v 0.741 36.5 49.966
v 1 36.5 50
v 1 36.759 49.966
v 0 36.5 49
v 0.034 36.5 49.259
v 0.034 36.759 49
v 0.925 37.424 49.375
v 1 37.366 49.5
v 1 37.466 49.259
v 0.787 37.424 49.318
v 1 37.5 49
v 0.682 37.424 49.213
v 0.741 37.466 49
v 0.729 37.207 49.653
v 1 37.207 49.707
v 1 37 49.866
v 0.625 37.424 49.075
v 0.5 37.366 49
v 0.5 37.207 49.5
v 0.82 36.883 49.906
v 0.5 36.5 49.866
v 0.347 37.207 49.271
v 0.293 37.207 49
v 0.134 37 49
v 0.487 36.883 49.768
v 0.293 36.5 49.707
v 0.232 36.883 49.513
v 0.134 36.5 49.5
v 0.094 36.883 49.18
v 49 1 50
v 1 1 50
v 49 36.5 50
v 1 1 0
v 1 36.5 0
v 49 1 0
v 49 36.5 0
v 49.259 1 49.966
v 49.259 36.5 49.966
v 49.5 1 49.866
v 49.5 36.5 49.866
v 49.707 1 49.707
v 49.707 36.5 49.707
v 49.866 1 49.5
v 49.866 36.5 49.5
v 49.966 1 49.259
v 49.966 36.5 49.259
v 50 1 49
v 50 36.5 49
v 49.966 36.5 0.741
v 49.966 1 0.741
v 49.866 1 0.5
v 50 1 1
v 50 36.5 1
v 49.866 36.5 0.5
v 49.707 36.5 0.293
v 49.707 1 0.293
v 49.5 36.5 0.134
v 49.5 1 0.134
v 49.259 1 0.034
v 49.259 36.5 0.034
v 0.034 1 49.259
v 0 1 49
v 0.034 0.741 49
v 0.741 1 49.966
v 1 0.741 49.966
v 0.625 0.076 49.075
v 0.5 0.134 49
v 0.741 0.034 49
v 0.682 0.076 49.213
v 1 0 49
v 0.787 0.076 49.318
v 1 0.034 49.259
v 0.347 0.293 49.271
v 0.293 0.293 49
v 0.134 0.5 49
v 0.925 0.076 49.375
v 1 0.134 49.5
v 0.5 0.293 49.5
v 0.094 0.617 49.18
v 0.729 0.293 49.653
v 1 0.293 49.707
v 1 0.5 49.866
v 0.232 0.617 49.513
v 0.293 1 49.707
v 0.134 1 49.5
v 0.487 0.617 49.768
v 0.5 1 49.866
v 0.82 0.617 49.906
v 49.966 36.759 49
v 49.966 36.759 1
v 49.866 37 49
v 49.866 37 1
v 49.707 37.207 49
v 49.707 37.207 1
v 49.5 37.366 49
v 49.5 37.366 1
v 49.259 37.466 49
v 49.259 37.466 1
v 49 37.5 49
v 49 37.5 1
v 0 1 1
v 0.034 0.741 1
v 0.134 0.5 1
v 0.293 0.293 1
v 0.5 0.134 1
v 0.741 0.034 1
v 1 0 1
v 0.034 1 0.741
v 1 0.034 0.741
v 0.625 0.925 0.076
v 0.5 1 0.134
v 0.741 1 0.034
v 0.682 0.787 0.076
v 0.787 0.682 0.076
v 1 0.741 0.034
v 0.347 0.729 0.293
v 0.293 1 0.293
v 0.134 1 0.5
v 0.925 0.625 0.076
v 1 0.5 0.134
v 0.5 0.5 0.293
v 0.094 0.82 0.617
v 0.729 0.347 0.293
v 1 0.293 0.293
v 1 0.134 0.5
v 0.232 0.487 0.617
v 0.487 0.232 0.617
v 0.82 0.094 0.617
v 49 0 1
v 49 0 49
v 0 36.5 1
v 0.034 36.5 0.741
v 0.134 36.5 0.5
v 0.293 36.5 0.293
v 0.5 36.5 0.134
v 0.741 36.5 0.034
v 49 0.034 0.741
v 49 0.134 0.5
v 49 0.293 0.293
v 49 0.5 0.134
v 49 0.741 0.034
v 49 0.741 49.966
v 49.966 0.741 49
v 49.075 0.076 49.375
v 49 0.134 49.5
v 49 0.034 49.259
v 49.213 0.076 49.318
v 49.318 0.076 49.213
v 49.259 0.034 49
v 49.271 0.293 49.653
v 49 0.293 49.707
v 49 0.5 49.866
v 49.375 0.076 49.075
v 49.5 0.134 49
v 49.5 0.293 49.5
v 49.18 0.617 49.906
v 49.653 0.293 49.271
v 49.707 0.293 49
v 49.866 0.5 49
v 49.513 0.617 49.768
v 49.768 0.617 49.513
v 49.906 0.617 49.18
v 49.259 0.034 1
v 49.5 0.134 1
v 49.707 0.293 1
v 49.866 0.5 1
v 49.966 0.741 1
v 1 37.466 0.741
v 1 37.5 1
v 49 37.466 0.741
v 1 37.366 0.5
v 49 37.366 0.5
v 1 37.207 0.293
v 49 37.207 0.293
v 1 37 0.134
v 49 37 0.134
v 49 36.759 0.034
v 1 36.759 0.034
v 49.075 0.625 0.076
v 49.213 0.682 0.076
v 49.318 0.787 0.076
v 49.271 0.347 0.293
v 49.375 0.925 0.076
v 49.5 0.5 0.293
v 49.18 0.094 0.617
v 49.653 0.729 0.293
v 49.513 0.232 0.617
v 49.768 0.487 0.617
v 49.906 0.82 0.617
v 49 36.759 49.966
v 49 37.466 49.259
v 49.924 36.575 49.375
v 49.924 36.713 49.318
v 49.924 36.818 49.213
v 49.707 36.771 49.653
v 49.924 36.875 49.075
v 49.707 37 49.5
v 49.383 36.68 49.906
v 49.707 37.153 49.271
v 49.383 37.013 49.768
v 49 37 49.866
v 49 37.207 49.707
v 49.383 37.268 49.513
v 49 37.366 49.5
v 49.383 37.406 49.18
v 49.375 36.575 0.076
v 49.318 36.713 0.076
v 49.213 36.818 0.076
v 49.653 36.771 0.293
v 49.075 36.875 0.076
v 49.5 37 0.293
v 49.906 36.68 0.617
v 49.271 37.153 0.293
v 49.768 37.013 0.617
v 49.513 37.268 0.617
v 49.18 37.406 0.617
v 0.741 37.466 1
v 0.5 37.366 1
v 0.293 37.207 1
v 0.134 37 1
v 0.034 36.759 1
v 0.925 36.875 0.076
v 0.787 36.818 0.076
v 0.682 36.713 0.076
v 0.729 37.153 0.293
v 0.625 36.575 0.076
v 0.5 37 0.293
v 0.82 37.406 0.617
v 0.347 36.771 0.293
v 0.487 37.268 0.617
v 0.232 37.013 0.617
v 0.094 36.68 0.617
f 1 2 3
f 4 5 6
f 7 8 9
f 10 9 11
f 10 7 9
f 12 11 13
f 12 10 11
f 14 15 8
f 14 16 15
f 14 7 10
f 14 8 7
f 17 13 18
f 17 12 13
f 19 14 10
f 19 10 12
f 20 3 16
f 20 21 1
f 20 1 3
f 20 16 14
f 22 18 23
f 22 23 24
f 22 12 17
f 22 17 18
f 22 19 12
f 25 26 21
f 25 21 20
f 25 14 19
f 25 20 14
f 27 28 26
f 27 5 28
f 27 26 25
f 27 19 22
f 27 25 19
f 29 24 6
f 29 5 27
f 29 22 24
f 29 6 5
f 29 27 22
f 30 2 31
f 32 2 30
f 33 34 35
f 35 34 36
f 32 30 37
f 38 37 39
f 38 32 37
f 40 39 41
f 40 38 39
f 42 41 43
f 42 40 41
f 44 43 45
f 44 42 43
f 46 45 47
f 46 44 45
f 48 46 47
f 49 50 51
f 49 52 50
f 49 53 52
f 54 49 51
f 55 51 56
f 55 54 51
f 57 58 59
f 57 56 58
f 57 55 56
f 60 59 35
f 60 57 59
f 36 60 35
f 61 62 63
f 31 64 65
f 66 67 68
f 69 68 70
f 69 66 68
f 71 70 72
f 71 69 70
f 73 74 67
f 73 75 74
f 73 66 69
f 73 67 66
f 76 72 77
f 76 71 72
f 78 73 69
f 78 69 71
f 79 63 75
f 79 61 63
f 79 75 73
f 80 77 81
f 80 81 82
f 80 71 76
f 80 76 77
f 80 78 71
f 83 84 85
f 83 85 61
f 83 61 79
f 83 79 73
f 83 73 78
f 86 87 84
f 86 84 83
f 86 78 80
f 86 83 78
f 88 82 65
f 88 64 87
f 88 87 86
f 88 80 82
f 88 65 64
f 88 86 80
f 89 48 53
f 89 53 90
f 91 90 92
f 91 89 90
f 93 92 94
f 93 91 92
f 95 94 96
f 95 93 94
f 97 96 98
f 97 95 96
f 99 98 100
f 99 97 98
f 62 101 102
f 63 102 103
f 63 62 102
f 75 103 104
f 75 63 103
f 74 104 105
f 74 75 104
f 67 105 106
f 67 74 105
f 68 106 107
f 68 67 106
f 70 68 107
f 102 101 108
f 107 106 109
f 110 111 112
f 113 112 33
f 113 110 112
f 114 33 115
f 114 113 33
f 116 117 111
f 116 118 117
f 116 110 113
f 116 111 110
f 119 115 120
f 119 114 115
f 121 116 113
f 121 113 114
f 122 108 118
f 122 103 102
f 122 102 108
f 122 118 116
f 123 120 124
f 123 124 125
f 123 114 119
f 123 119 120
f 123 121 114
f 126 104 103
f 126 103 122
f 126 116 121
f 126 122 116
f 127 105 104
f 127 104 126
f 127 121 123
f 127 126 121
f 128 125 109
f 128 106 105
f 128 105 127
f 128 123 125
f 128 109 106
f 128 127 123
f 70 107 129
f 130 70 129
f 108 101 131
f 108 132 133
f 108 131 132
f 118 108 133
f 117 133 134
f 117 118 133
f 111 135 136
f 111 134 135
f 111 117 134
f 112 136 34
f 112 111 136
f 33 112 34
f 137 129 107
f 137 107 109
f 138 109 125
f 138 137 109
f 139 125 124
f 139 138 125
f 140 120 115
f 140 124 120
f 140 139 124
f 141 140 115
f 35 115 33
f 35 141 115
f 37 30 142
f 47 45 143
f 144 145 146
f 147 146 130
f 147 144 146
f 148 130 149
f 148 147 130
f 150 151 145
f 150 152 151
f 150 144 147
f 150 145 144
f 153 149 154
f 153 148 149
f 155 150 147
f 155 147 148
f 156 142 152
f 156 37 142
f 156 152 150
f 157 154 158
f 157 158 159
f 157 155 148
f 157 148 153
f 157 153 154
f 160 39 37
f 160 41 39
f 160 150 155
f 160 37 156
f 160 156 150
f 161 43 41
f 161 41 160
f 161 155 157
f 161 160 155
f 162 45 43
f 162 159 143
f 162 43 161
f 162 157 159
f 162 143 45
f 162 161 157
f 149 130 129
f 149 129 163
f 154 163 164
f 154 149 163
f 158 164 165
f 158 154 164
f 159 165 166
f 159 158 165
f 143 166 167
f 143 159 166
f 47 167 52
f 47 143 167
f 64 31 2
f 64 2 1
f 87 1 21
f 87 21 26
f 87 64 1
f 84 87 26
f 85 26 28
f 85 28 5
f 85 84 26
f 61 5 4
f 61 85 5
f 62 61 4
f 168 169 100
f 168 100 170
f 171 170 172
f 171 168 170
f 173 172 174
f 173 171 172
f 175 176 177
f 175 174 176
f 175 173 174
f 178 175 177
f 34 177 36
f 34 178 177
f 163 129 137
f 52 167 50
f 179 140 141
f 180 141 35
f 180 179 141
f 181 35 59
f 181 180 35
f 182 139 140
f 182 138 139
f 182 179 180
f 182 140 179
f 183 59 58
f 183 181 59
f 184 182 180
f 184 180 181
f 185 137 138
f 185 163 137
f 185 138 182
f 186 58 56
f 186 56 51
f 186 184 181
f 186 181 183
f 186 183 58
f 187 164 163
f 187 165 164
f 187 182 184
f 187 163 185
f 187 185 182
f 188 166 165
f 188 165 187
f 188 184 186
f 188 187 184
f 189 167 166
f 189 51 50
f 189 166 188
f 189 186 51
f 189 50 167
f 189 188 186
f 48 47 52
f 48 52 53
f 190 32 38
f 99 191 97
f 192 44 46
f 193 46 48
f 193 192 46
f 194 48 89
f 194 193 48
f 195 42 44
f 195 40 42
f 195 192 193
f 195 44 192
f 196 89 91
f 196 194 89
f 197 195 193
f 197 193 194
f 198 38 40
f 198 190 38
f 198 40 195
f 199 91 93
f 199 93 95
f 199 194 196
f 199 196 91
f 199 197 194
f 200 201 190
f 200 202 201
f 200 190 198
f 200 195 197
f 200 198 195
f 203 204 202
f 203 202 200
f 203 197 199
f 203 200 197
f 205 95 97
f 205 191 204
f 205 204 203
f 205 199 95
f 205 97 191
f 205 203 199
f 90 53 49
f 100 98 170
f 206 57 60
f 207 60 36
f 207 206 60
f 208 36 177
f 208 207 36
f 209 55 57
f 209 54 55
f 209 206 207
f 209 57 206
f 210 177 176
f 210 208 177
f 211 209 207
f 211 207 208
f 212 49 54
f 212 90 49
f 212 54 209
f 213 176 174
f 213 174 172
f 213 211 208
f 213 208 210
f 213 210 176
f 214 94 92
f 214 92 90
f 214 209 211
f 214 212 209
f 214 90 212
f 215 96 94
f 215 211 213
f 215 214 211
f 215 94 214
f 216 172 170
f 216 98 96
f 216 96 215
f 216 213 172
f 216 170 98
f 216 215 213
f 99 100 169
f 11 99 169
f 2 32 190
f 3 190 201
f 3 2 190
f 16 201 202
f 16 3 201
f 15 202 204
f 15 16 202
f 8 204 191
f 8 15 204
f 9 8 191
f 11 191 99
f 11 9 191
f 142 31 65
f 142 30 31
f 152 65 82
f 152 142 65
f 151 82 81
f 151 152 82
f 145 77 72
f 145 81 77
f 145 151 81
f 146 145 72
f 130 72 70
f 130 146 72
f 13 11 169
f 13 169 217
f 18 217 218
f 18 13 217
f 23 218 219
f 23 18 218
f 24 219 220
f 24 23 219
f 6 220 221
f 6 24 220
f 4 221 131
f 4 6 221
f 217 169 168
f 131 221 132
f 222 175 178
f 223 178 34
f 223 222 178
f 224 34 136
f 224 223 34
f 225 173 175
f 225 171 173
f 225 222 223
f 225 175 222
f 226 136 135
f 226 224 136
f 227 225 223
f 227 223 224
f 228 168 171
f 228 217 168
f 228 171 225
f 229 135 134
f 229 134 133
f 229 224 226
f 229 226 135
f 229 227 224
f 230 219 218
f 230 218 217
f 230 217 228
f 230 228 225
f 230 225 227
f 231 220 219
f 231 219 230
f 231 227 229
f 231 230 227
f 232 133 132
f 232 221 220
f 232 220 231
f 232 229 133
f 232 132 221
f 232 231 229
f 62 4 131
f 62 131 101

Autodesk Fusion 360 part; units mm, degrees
sketch "Esquisse1" plane through (0, 0, 0) normal (0, 0, 1) x (1, 0, 0)
  line L0 (0, 0) -> (50, 0)
  line L1 (50, 0) -> (50, 37.5)
  line L2 (50, 37.5) -> (0, 37.5)
  line L3 (0, 37.5) -> (0, 0)
  dimension "d1" = 50
  dimension "d2" = 37.5
extrude "Extrusion1" add sketch "Esquisse1" along normal blind 50
fillet "Congé1" radius 1 5 faces at (16.6667, 25, 50) (0, 25, 16.6667) (16.6667, 0, 16.6667) (33.3333, 37.5, 16.6667) (50, 12.5, 16.6667)
equation "d2 = pipe_diameter + pipe_wall_distance"
equation "pipe_diameter = 34 mm"
equation "pipe_wall_distance = 3.5 mm"
